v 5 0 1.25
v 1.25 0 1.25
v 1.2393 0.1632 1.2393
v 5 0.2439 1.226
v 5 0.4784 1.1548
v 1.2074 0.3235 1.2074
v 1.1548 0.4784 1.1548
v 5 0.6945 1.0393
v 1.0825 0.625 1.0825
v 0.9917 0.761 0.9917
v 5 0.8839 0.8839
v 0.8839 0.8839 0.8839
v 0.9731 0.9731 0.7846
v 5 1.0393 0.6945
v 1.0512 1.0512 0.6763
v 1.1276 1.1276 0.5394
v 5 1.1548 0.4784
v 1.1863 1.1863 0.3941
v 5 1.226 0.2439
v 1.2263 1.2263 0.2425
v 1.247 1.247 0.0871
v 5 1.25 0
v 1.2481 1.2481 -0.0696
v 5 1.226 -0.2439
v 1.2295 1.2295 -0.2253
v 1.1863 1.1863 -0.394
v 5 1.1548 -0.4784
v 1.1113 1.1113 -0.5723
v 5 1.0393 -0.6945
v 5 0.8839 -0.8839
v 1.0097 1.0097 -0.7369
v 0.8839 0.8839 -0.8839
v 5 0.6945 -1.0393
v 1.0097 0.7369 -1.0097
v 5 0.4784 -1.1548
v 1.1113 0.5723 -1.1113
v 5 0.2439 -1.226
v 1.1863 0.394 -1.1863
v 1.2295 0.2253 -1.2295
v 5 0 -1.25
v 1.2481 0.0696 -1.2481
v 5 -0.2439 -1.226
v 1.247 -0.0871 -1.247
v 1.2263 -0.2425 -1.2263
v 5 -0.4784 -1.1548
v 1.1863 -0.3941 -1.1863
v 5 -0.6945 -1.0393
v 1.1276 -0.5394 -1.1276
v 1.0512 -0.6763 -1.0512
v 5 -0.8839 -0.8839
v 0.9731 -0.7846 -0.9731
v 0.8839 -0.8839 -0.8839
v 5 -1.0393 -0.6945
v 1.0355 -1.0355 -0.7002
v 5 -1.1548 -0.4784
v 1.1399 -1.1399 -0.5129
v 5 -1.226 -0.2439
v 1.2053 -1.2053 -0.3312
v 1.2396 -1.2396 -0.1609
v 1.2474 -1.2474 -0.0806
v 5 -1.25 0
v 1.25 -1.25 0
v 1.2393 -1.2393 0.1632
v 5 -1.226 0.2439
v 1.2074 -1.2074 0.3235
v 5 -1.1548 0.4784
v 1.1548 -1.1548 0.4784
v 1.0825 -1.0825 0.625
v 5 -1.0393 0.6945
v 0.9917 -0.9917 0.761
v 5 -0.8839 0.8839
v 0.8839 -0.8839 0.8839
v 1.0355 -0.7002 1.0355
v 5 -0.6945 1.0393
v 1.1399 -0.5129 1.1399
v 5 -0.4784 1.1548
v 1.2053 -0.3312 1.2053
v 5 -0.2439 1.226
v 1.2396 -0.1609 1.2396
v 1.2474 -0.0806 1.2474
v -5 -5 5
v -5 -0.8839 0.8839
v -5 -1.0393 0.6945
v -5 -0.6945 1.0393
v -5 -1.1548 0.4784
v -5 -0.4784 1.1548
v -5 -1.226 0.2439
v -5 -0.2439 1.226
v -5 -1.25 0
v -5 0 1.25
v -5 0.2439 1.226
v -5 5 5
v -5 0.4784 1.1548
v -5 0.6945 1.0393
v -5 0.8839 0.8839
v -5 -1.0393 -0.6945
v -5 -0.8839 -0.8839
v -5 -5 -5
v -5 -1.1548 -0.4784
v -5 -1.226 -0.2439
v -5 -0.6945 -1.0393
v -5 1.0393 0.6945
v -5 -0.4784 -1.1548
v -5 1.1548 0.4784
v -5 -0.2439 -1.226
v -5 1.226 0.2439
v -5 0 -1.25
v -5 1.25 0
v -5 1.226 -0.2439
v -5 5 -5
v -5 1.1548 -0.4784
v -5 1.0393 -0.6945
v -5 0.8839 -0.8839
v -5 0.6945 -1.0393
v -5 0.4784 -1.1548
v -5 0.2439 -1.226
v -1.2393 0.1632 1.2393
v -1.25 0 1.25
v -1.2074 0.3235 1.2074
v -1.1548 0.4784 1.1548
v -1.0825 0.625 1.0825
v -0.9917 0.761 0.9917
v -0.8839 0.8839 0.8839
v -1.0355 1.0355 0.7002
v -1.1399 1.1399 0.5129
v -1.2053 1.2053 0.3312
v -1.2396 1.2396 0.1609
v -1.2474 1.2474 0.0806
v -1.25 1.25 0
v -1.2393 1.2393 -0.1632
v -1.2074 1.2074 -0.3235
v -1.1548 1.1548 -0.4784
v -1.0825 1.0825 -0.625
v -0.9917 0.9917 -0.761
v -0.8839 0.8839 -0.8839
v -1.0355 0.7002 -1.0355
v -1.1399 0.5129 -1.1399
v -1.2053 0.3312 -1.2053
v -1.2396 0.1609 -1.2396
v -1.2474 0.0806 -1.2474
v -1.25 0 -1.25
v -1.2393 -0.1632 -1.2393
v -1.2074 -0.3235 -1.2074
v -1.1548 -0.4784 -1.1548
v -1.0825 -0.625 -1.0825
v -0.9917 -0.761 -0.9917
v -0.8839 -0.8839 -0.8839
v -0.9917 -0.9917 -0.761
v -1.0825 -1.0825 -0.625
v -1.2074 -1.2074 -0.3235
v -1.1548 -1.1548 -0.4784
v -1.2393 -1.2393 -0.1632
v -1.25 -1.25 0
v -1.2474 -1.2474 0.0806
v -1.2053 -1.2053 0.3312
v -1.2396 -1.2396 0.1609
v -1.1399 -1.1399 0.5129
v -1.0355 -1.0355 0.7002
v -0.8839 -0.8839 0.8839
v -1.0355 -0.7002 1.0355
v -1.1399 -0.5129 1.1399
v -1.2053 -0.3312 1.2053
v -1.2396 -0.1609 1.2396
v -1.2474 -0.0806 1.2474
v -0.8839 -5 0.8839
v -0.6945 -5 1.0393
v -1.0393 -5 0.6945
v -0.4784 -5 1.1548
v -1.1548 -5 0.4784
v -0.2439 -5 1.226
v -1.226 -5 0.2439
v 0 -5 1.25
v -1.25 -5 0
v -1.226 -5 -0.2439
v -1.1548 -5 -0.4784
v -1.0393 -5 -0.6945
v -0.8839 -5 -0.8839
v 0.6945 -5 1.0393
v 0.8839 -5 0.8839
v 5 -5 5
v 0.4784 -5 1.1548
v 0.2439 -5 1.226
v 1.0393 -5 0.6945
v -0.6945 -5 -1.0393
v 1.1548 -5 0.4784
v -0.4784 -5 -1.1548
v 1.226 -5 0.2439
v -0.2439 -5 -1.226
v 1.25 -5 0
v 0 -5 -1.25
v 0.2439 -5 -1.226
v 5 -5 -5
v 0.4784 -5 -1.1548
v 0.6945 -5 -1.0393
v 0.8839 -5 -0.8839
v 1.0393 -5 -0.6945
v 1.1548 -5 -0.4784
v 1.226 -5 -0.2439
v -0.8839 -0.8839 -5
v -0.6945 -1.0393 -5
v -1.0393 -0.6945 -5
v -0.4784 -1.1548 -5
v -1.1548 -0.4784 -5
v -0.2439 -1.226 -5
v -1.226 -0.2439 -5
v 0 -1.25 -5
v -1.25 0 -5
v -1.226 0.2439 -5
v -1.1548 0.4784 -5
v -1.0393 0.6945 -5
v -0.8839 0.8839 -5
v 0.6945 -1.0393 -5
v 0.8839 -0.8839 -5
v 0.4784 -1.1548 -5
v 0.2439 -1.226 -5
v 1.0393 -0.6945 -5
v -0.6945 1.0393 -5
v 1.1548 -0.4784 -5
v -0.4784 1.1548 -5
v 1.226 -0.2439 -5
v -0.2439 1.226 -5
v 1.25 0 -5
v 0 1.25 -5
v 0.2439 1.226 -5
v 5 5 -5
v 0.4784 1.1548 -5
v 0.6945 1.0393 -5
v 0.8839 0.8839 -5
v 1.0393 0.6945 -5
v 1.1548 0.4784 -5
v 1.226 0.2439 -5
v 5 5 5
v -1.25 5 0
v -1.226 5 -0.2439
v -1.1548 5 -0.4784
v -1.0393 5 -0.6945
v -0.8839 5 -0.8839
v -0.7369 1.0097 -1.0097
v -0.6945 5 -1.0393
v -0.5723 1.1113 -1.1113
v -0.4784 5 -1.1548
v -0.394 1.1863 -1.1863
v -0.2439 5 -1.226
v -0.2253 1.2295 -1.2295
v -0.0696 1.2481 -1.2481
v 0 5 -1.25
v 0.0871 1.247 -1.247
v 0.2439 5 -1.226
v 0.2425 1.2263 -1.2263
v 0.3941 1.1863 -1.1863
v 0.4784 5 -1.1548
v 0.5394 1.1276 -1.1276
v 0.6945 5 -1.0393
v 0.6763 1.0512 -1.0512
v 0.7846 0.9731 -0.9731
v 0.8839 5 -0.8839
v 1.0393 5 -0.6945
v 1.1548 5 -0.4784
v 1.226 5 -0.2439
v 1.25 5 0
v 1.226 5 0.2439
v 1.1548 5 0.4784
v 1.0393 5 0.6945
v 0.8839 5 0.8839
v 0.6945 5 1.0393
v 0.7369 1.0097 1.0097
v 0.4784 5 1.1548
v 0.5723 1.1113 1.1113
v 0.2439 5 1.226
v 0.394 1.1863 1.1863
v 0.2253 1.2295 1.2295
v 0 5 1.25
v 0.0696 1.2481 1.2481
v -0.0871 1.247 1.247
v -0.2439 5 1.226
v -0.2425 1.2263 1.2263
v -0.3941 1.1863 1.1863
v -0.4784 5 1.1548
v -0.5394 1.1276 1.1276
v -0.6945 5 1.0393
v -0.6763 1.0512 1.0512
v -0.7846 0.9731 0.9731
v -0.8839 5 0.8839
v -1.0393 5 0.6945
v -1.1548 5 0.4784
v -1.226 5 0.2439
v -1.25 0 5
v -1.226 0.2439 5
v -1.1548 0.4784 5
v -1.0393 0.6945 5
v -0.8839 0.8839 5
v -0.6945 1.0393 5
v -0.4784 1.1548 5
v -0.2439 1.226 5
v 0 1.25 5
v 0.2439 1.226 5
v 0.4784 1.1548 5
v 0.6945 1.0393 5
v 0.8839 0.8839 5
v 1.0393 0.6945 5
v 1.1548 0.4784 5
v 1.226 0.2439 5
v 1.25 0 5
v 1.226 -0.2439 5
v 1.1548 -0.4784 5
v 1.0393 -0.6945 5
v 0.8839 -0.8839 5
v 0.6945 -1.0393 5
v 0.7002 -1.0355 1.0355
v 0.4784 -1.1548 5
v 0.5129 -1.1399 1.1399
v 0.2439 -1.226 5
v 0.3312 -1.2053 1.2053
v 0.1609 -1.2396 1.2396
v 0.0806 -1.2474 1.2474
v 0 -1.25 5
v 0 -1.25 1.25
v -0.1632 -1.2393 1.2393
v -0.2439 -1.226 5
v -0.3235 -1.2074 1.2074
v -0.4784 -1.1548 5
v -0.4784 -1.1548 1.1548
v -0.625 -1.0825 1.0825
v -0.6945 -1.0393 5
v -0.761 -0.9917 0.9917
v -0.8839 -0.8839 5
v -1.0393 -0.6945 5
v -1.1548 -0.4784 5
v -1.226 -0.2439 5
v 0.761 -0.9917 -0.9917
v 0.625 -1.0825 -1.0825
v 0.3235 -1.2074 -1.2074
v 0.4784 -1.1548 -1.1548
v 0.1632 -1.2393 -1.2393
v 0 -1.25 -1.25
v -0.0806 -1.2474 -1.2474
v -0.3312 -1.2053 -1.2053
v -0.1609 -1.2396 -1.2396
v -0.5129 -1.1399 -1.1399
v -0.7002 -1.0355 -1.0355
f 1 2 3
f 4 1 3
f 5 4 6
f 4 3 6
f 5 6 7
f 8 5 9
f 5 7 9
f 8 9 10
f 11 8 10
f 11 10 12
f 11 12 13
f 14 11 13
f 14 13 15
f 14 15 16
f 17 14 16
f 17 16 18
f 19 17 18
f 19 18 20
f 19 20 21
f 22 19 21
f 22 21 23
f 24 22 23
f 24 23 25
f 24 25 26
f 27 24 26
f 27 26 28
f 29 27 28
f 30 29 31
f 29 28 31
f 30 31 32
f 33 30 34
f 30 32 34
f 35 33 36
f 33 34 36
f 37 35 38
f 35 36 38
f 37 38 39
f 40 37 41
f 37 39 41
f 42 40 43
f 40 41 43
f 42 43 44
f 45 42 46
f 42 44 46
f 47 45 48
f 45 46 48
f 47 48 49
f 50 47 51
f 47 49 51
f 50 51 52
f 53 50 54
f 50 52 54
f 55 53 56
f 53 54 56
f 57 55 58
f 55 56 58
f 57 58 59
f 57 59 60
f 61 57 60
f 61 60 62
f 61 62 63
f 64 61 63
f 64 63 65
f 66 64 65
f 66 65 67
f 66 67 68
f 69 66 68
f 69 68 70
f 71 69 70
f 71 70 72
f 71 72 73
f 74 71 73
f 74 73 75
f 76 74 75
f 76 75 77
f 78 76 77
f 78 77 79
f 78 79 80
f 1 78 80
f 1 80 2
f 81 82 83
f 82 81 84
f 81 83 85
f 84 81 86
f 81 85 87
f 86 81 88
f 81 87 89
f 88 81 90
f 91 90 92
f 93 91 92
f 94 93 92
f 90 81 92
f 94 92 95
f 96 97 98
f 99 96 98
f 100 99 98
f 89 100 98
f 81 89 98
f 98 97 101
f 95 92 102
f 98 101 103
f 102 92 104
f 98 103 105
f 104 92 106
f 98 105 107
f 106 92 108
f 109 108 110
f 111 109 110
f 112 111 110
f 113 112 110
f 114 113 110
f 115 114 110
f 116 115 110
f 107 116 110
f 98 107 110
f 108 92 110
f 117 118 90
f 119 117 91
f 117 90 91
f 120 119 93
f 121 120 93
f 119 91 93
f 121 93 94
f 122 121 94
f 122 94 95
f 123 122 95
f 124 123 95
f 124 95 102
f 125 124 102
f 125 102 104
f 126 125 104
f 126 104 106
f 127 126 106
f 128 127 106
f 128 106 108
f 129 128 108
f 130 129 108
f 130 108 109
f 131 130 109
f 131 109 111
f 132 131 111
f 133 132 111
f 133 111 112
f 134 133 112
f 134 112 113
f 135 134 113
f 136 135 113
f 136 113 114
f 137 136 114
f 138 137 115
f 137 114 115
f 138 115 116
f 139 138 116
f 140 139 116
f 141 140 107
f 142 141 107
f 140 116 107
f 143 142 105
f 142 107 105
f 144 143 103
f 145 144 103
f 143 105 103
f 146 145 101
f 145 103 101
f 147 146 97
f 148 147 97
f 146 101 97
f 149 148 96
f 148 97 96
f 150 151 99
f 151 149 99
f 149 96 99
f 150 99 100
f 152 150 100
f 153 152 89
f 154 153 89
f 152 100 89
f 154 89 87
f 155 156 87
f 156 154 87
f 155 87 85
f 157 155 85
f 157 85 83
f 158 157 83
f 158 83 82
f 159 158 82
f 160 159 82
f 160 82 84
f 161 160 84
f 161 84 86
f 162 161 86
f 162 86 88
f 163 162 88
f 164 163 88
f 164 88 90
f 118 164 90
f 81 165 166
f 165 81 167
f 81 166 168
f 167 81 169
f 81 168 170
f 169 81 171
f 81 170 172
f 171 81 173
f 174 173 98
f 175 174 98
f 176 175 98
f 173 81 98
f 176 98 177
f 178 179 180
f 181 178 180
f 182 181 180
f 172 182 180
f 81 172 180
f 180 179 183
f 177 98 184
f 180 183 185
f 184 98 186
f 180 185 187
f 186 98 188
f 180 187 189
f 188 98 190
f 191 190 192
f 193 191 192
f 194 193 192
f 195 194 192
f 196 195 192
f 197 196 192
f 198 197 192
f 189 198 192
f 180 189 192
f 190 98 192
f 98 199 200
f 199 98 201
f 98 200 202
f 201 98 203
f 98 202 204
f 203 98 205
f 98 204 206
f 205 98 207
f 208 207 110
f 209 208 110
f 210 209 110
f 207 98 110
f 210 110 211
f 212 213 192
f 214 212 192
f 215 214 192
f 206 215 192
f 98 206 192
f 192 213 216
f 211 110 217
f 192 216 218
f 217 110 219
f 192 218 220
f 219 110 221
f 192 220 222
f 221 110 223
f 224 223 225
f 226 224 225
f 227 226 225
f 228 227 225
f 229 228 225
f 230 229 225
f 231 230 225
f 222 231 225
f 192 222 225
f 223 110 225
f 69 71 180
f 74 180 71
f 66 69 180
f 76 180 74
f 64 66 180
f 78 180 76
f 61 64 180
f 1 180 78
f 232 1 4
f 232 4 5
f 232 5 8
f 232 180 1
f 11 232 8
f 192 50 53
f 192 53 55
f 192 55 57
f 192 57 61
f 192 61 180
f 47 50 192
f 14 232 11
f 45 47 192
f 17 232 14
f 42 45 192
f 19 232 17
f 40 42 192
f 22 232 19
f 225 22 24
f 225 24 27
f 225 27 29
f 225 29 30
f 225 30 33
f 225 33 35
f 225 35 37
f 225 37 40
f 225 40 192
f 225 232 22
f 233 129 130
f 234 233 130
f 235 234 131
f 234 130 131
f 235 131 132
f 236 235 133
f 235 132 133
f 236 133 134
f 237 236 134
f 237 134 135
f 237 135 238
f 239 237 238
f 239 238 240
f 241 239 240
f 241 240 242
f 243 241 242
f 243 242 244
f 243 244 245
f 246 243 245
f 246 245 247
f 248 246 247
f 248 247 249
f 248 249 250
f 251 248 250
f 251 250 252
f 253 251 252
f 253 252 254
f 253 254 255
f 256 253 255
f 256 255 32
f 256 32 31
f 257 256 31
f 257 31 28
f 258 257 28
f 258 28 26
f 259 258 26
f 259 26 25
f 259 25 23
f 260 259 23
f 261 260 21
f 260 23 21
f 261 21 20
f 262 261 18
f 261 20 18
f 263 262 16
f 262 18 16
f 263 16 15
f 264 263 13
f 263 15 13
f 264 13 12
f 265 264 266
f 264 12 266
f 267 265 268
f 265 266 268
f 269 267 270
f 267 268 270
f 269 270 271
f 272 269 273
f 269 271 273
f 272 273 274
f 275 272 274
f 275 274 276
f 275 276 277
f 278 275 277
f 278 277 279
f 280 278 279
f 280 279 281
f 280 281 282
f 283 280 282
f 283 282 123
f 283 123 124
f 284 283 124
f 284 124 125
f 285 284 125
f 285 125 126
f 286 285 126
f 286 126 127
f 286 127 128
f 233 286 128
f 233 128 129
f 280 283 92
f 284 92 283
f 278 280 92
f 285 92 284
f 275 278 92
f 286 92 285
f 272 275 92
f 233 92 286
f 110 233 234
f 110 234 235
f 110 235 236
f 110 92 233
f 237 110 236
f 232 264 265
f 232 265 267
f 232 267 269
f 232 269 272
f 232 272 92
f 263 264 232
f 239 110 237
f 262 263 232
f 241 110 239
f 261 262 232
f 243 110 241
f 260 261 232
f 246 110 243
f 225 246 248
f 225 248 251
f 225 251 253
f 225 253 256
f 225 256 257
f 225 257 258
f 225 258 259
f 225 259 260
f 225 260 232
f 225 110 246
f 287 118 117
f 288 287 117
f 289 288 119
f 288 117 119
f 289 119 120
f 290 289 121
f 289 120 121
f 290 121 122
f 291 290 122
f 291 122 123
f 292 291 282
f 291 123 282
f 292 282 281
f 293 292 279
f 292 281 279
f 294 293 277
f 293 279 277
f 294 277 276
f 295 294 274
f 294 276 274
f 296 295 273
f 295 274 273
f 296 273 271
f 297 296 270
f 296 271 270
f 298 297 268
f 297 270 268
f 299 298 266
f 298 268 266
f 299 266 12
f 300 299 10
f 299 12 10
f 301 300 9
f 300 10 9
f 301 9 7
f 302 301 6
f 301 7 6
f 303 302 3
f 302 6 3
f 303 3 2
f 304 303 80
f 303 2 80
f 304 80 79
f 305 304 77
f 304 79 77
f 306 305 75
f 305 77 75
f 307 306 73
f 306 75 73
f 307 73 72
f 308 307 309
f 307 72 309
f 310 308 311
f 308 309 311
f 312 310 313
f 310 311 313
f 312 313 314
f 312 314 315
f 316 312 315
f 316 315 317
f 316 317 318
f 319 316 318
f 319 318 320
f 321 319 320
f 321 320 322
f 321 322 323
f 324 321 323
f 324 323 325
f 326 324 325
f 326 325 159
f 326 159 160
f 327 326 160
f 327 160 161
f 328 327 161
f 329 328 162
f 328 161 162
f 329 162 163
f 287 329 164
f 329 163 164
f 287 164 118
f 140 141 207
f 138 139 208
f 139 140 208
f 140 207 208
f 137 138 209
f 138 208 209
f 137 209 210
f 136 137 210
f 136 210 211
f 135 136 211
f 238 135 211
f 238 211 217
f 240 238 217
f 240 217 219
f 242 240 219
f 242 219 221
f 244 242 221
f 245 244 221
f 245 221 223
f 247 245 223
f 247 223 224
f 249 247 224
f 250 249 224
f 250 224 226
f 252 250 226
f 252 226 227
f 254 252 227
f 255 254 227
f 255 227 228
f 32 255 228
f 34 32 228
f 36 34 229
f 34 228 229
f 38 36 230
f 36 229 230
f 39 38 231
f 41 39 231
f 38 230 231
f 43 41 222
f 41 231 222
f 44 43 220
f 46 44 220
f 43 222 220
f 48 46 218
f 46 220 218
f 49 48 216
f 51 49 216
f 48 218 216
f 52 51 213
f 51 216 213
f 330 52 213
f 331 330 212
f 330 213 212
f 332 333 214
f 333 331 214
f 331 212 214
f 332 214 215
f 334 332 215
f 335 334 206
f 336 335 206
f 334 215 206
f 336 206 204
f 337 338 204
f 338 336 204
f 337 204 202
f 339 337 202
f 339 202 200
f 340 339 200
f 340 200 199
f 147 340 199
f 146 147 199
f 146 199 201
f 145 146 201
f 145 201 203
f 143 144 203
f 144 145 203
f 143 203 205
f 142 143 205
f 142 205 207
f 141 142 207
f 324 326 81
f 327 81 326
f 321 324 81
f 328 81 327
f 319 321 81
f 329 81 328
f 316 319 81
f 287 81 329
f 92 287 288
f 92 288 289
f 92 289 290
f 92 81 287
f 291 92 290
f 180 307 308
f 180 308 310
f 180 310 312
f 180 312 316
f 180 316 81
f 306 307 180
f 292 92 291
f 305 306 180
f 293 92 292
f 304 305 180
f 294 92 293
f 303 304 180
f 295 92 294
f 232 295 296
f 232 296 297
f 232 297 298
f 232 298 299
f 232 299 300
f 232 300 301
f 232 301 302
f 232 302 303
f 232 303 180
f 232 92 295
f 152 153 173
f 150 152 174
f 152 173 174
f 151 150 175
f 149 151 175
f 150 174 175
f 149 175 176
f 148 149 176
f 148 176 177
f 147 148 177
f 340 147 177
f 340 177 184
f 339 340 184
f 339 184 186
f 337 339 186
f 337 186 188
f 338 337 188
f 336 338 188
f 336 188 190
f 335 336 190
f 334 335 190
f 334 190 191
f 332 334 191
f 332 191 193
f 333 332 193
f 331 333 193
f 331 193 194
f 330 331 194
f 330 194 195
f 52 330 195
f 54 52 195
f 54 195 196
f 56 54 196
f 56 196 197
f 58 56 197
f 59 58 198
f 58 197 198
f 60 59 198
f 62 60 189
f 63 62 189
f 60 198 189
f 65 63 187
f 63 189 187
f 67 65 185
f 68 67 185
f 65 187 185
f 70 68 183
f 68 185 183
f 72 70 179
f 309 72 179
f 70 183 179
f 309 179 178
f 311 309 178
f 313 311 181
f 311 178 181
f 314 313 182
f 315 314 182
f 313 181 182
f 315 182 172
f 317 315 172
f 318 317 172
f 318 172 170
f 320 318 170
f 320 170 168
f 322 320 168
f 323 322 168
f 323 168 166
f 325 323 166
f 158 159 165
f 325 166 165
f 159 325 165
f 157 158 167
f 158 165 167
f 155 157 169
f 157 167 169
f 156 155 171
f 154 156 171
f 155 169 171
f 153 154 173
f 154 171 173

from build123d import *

# Parameters (mm, degrees)
SKETCH_1_W      = 10
SKETCH_1_H      = 10
EXTRUDE_1_DEPTH = 5
HOLE_WIZARD_1_D = 2.5
HOLE_WIZARD_2_D = 2.5
HOLE_WIZARD_3_D = 2.5


with BuildPart() as part:
    # 草图1 → 凸台-拉伸1 (new, symmetric)
    with BuildSketch(Plane(origin=(0, 0, 0), x_dir=(1, 0, 0), z_dir=(0, 1, 0))):
        Rectangle(SKETCH_1_W, SKETCH_1_H)
    extrude(amount=EXTRUDE_1_DEPTH, both=True)

    # Hole Wizard 1 (through all)
    with Locations(Plane(origin=(0, 5, 0), x_dir=(1, 0, 0), z_dir=(0, 1, 0))):
        with Locations((0, 0)):
            Hole(HOLE_WIZARD_1_D / 2)

    # Hole Wizard 2 (through all)
    with Locations(Plane(origin=(5, 0, 0), x_dir=(0, 0, -1), z_dir=(1, 0, 0))):
        with Locations((0, 0)):
            Hole(HOLE_WIZARD_2_D / 2)

    # Hole Wizard 3 (through all)
    with Locations(Plane.XY.offset(5)):
        with Locations((0, 0)):
            Hole(HOLE_WIZARD_3_D / 2)


solid = part.part
